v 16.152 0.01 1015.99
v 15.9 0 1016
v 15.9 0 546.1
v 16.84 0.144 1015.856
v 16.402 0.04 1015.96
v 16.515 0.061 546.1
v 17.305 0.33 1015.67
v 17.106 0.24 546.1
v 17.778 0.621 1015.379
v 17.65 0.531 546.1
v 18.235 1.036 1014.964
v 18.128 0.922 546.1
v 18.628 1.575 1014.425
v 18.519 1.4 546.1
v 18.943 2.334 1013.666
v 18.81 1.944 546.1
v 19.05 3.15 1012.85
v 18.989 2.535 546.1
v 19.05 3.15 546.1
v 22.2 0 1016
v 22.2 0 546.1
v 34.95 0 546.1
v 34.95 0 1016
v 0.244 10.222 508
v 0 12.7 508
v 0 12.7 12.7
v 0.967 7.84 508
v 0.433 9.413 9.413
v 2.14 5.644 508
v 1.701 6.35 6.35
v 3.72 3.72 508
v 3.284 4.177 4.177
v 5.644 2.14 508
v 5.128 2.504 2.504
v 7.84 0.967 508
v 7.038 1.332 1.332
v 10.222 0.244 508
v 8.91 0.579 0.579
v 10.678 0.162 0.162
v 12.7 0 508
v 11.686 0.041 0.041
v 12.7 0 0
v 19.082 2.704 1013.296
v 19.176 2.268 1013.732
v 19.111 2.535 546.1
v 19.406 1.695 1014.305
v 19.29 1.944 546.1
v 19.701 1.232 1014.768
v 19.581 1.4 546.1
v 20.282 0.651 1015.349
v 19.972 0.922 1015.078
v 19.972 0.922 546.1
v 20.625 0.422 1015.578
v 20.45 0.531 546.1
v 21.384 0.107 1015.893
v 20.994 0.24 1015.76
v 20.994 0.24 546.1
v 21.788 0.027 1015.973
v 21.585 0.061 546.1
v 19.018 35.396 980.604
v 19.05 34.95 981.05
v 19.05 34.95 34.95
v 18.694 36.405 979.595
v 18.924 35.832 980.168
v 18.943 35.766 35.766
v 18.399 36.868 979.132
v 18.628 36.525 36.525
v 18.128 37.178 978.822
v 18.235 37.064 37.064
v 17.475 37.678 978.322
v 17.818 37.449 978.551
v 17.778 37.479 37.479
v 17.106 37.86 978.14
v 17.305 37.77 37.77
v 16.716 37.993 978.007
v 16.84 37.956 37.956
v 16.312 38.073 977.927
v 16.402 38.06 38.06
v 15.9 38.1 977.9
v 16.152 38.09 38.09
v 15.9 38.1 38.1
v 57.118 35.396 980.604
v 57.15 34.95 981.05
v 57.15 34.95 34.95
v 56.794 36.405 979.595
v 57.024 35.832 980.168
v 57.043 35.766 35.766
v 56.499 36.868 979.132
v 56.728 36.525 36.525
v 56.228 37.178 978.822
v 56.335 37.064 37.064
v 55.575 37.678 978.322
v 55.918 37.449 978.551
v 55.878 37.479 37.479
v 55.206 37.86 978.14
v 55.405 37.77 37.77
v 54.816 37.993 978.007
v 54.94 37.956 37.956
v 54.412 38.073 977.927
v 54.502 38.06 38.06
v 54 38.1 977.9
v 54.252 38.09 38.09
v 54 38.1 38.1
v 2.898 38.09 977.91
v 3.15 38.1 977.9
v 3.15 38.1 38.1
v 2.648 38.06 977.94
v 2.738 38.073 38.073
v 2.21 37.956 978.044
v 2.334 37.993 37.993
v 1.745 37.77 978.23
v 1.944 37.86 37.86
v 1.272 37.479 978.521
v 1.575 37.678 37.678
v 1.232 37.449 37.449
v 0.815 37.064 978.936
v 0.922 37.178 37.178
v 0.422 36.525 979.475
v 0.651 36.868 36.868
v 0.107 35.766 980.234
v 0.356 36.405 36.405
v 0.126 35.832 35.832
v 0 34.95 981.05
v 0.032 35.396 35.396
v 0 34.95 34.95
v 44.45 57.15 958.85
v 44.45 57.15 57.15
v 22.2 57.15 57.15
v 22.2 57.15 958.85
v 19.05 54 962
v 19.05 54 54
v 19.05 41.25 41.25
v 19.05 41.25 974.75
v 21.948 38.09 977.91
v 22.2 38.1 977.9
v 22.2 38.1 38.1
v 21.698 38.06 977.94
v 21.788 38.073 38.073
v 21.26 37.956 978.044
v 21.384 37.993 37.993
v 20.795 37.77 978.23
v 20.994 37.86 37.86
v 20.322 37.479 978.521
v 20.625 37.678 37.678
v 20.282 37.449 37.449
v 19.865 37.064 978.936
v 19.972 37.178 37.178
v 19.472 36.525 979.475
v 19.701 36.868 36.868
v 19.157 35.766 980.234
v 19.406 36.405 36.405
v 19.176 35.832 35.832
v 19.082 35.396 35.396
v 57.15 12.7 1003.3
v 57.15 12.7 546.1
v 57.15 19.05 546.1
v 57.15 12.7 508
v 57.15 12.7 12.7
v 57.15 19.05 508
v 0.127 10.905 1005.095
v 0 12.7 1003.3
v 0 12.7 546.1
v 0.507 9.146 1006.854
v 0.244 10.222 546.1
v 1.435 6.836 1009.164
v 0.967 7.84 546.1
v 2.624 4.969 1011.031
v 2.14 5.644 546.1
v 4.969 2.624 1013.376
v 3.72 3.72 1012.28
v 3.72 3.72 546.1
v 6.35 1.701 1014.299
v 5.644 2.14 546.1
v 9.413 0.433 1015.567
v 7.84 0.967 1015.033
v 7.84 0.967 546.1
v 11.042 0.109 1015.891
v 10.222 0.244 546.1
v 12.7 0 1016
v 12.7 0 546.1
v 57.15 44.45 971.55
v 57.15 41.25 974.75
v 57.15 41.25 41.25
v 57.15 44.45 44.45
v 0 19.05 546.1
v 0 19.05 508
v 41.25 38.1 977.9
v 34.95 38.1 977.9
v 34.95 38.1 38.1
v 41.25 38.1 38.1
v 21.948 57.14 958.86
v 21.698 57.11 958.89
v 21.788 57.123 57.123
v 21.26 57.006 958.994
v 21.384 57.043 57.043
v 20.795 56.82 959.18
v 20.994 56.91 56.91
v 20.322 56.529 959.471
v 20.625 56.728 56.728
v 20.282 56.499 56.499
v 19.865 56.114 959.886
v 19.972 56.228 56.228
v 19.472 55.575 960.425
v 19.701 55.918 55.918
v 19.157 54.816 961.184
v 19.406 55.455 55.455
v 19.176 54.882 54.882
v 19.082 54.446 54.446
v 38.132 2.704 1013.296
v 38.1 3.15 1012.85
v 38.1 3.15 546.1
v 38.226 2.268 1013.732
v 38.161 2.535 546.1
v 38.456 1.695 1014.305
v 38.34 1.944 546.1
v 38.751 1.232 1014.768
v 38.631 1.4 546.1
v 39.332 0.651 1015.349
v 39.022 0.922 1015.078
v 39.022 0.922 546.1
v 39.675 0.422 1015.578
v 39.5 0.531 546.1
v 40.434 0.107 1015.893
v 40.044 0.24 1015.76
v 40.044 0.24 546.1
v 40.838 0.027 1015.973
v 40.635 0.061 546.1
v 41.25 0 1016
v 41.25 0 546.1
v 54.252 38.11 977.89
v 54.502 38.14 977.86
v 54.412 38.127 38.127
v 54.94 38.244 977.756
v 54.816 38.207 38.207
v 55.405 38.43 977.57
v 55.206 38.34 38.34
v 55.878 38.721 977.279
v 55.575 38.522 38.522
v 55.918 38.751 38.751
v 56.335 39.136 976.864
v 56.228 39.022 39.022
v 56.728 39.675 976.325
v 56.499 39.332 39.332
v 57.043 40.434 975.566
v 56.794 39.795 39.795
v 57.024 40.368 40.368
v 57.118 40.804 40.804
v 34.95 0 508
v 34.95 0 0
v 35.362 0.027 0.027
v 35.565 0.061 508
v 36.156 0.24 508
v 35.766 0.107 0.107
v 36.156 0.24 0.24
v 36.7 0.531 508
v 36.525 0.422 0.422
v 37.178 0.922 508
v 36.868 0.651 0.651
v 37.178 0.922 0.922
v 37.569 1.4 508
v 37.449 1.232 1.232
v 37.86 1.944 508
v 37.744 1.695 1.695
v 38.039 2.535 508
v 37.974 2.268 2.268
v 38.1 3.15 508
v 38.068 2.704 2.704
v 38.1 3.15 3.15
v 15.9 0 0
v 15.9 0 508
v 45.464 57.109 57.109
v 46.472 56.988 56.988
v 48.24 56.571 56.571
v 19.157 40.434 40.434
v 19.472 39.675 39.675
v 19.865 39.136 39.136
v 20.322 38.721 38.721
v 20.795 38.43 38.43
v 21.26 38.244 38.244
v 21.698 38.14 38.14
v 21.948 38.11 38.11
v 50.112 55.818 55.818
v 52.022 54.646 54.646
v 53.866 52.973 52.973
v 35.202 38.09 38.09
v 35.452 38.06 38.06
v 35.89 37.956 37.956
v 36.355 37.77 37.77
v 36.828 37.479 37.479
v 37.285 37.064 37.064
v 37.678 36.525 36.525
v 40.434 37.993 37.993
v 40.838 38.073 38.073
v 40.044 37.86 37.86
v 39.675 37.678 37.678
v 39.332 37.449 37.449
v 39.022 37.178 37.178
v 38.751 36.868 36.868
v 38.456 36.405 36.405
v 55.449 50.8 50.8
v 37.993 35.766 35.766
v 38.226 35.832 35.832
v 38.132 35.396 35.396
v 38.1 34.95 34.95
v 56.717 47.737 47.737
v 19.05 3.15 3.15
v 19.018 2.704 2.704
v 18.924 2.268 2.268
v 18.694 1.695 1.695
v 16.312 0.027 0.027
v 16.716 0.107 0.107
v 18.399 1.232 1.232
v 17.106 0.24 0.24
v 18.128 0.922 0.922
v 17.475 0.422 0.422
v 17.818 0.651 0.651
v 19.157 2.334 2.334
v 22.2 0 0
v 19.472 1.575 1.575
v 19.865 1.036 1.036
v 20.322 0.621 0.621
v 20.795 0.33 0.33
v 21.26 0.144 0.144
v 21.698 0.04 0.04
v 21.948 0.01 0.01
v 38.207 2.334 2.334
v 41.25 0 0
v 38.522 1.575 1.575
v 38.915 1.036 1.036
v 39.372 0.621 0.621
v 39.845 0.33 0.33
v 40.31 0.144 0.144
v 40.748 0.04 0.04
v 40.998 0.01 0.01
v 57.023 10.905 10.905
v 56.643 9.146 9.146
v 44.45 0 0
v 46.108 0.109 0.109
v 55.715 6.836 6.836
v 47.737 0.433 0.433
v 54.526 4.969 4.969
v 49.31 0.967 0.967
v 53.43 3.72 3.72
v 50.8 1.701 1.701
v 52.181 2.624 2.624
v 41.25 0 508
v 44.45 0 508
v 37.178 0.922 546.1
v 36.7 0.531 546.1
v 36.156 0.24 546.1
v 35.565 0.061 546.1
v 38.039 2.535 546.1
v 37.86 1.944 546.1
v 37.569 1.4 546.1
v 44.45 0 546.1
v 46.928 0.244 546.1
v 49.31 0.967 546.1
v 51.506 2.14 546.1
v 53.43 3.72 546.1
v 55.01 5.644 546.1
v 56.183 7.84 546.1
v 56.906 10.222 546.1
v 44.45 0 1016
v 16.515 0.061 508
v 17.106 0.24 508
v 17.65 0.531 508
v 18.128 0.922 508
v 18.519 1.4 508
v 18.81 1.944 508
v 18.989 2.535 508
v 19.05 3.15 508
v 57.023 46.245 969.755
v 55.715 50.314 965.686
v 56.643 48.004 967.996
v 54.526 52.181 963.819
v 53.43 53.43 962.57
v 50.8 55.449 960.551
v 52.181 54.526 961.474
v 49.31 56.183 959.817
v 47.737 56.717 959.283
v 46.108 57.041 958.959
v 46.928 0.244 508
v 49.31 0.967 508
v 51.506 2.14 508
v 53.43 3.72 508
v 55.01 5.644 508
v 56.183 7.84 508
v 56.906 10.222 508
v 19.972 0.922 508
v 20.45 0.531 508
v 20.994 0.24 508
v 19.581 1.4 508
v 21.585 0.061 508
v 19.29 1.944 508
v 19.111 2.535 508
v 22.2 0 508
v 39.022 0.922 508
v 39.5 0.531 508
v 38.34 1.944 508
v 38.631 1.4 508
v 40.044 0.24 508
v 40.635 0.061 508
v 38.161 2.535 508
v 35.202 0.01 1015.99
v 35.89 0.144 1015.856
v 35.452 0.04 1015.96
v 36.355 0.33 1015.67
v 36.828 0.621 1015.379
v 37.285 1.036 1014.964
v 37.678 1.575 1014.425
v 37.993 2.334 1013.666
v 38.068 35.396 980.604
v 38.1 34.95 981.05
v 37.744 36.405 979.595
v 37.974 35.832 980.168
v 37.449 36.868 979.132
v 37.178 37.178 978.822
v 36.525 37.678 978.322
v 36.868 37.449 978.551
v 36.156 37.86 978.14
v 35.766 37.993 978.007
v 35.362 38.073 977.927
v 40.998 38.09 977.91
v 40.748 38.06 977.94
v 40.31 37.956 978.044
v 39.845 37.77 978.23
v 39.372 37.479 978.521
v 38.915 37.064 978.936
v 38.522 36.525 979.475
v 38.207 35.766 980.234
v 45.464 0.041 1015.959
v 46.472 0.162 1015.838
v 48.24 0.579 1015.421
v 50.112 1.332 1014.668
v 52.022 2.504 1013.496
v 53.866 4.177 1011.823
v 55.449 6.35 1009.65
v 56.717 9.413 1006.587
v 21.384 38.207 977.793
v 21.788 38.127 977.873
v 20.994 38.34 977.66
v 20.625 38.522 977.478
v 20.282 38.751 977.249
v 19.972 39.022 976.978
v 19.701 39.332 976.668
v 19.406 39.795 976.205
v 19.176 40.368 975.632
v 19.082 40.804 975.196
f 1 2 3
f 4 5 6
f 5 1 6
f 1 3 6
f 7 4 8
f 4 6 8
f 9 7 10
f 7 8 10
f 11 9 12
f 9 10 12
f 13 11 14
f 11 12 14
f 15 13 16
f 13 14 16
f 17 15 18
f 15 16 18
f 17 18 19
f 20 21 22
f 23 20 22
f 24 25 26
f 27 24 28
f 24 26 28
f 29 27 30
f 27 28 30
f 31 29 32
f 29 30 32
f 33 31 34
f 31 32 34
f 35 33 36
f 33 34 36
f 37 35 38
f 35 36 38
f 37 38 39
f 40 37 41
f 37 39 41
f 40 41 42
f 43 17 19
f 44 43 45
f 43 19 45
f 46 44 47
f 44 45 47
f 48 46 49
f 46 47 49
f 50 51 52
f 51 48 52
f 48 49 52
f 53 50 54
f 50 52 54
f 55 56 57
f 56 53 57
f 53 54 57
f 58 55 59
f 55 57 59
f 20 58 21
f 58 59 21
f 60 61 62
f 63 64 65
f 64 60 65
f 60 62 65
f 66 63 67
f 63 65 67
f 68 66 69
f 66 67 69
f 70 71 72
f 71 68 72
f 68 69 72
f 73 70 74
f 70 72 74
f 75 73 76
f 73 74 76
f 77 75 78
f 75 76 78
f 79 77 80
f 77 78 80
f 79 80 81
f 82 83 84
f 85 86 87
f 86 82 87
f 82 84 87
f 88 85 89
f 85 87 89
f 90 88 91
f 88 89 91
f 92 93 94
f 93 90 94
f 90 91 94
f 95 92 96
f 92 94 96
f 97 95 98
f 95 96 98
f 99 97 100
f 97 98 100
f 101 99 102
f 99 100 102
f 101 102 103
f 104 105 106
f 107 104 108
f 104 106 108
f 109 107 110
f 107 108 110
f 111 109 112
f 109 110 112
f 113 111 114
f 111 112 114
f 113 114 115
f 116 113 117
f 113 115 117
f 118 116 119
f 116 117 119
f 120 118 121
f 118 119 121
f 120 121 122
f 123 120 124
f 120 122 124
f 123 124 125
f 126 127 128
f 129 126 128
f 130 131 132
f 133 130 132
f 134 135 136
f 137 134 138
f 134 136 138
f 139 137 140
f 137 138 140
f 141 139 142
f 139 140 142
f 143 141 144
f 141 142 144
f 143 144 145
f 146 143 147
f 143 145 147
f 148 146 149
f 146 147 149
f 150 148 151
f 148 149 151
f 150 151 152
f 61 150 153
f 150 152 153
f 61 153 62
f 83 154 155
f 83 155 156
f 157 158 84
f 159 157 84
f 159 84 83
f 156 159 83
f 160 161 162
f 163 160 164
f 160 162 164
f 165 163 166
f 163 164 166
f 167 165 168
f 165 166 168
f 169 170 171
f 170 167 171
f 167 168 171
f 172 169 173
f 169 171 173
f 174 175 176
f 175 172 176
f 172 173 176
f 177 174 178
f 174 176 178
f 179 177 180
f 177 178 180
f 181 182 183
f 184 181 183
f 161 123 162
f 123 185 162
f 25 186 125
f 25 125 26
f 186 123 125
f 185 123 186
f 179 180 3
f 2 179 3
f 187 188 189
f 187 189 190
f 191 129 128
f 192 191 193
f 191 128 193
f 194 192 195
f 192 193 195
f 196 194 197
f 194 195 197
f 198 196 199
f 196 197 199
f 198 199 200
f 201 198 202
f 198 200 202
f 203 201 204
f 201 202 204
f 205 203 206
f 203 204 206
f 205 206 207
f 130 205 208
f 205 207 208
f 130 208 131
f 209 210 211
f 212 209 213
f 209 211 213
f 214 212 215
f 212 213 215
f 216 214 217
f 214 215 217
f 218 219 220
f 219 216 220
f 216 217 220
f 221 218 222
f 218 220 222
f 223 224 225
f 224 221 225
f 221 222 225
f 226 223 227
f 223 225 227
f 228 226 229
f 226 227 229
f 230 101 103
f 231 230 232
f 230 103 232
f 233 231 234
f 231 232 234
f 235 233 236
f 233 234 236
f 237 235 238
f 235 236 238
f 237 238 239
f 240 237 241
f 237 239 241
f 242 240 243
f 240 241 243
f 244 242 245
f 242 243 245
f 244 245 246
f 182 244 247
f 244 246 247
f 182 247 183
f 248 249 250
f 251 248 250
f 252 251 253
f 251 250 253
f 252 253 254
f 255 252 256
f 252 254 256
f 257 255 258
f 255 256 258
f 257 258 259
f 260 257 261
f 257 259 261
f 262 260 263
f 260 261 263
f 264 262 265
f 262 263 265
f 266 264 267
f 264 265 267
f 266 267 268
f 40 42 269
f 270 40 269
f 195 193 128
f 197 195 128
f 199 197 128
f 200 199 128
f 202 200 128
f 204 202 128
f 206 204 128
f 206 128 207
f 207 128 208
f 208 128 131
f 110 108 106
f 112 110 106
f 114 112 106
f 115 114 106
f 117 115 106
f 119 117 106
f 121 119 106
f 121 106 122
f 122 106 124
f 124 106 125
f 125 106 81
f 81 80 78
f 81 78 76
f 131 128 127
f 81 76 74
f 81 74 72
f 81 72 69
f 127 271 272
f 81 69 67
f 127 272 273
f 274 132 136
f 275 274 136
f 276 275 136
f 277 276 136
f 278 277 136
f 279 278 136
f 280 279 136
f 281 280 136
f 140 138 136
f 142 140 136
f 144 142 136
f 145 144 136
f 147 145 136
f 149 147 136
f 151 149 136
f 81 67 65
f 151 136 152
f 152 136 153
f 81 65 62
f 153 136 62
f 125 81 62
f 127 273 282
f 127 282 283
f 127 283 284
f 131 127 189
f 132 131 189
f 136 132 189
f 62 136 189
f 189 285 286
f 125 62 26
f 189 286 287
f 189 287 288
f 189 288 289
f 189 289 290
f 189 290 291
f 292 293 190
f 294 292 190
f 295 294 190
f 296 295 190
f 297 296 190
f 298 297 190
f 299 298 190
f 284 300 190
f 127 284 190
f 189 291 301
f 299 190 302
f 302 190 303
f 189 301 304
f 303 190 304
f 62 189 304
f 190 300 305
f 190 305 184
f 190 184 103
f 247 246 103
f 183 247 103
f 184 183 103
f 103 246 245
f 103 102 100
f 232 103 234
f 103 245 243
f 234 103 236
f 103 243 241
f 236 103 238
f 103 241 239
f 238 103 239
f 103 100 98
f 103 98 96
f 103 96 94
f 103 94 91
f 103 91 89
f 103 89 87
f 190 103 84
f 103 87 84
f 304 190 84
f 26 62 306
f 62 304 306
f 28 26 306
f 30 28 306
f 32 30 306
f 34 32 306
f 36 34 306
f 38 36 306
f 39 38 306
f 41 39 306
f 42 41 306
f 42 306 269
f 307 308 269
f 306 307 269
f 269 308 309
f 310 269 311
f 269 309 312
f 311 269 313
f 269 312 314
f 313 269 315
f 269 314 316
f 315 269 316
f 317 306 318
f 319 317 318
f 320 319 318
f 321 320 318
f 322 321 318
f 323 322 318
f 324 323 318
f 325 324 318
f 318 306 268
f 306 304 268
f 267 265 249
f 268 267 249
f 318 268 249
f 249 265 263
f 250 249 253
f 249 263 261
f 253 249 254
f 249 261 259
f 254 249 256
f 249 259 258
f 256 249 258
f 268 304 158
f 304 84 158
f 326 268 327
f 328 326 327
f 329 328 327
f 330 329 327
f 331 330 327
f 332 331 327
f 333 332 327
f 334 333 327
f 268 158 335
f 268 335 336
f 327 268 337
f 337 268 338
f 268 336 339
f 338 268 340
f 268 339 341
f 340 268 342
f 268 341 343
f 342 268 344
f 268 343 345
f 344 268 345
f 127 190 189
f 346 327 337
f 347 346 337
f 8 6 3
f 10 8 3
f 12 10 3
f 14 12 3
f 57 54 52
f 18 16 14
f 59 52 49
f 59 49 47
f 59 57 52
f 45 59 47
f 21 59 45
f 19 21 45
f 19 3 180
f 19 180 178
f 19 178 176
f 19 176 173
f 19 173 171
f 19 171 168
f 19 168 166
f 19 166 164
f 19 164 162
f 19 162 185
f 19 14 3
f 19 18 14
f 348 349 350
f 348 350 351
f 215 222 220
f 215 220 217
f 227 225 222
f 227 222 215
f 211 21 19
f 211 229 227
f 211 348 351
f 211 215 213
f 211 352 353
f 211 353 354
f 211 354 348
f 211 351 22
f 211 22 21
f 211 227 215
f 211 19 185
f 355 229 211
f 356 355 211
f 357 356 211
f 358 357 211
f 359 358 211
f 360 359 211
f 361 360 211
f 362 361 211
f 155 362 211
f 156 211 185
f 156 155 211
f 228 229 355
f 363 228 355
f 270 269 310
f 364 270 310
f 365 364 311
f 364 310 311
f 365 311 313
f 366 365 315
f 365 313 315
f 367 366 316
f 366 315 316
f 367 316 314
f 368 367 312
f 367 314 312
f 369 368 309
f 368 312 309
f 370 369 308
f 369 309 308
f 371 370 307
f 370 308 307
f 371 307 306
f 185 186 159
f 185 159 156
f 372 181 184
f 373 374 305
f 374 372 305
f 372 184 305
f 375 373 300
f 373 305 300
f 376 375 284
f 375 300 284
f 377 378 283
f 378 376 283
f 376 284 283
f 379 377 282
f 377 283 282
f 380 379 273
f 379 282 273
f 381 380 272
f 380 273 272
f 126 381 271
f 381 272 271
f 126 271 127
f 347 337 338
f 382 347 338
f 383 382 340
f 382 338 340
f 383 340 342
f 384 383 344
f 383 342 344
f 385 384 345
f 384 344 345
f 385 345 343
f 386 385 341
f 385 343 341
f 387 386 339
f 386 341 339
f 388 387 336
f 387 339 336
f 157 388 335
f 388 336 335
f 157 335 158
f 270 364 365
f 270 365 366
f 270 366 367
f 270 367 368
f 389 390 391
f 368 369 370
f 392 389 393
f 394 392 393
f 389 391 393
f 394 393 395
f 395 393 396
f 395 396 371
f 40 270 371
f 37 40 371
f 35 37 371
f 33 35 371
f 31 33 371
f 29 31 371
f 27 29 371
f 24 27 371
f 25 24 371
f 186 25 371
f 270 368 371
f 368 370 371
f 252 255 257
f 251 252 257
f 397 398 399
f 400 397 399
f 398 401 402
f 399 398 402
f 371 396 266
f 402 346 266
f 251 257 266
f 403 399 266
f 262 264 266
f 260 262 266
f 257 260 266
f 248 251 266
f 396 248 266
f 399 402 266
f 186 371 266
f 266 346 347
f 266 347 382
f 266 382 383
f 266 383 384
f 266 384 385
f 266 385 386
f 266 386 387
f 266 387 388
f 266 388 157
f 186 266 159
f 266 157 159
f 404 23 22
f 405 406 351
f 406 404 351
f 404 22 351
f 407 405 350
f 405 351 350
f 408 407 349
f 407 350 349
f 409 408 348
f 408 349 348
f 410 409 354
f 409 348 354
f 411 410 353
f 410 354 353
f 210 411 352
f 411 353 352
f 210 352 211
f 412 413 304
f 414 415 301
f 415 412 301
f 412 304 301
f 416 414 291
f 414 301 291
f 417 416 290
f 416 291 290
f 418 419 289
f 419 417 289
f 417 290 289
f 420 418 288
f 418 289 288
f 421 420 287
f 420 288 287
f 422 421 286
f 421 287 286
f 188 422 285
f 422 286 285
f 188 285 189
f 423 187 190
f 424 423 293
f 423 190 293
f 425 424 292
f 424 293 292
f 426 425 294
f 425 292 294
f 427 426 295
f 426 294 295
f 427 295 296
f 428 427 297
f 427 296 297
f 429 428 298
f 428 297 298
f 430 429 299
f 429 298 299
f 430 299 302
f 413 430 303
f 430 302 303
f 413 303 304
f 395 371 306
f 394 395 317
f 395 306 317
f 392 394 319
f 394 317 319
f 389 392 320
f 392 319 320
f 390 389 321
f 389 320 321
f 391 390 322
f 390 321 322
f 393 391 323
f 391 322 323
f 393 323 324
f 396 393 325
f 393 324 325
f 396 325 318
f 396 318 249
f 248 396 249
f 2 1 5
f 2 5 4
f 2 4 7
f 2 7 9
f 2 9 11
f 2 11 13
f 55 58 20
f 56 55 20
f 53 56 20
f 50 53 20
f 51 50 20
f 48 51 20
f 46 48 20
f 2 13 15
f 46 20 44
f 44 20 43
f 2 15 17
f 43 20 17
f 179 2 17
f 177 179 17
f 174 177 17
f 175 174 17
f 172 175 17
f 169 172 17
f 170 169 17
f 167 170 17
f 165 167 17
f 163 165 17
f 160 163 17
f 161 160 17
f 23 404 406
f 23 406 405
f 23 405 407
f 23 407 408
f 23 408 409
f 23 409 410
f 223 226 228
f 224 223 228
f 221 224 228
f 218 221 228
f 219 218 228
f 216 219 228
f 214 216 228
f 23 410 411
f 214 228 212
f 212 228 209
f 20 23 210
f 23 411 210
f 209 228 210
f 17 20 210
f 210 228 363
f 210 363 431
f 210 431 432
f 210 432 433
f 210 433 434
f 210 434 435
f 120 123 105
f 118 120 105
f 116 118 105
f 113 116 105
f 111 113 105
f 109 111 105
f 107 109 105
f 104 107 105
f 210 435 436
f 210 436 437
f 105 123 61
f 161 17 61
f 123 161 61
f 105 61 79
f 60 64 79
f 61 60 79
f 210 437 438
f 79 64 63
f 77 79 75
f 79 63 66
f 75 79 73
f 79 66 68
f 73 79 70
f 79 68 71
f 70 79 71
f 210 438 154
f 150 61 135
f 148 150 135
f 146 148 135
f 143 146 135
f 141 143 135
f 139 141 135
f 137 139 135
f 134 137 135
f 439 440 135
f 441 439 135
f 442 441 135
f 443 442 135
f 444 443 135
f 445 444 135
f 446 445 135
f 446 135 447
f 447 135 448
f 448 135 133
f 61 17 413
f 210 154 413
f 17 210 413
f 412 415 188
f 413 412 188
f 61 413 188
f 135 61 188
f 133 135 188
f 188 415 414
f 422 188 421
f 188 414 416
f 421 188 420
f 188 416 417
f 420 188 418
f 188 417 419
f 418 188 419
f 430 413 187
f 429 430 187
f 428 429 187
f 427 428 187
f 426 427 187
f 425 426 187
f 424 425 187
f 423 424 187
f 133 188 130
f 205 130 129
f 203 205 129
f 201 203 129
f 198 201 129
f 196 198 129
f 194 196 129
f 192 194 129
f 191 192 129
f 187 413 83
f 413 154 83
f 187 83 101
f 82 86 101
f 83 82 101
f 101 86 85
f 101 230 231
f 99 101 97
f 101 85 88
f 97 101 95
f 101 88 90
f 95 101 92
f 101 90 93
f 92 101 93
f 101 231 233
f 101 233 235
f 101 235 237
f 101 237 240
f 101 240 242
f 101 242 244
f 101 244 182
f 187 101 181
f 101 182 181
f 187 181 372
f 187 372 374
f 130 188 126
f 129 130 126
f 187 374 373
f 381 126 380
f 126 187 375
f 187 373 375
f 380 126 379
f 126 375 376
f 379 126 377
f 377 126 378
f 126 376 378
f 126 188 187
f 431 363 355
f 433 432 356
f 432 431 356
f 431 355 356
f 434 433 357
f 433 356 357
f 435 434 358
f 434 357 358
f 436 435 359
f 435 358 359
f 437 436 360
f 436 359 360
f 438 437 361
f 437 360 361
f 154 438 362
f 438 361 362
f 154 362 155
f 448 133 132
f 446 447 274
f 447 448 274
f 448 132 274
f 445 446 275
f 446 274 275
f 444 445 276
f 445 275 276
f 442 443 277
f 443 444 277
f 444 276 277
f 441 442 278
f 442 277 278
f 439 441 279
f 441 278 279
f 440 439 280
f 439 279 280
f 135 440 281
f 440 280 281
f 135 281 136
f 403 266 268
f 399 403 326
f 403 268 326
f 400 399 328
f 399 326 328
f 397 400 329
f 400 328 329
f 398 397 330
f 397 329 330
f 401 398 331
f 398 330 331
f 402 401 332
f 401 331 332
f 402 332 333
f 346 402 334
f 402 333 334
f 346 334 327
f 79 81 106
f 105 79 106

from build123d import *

# Parameters (mm, degrees)
F1_DEPTH = 1016
F3_DEPTH = 57.151
F4_W     = 19.05
F4_H     = 38.1
F5_DEPTH = 57.151


# Not quite as in the source:
# - ends of sketch curves that miss each other by under 0.0002 mm in the source are joined


with BuildPart() as f1:
    # F0 (on Top) → F1 (new body)
    with BuildSketch(Plane.XY):
        with BuildLine():
            ThreePointArc((0, 12.7), (3.7197438789, 3.7197438789), (12.7, 0))
            Line((12.7, 0), (15.9004, 0))
            ThreePointArc((15.9004, 0), (18.127503518, 0.922496482), (19.05, 3.1496))
            Line((19.05, 3.1496), (19.05, 34.9504))
            ThreePointArc((19.05, 34.9504), (18.127503518, 37.177503518), (15.9004, 38.1))
            Line((15.9004, 38.1), (3.1496, 38.1))
            ThreePointArc((3.1496, 38.1), (0.922496482, 37.177503518), (0, 34.9504))
            Line((0, 34.9504), (0, 12.7))
        make_face()
        with BuildLine():
            Line((19.05, 34.9504), (19.05, 3.1496))
            ThreePointArc((19.05, 3.1496), (19.972496482, 0.922496482), (22.1996, 0))
            Line((22.1996, 0), (34.9504, 0))
            ThreePointArc((34.9504, 0), (37.177503518, 0.922496482), (38.1, 3.1496))
            Line((38.1, 3.1496), (38.1, 34.9504))
            ThreePointArc((38.1, 34.9504), (37.177503518, 37.177503518), (34.9504, 38.1))
            Line((34.9504, 38.1), (22.1996, 38.1))
            ThreePointArc((22.1996, 38.1), (19.972496482, 37.177503518), (19.05, 34.9504))
        make_face()
        with BuildLine():
            Line((38.1, 34.9504), (38.1, 3.1496))
            ThreePointArc((38.1, 3.1496), (39.022496482, 0.922496482), (41.2496, 0))
            Line((41.2496, 0), (44.45, 0))
            ThreePointArc((44.45, 0), (53.4302561211, 3.7197438789), (57.15, 12.7))
            Line((57.15, 12.7), (57.15, 34.9504))
            ThreePointArc((57.15, 34.9504), (56.227503518, 37.177503518), (54.0004, 38.1))
            Line((54.0004, 38.1), (41.2496, 38.1))
            ThreePointArc((41.2496, 38.1), (39.022496482, 37.177503518), (38.1, 34.9504))
        make_face()
        with BuildLine():
            ThreePointArc((19.0499988437, 41.2496), (19.9724953256, 39.022496482), (22.1995988437, 38.1))
            Line((22.1995988437, 38.1), (34.9504, 38.1))
            Line((34.9504, 38.1), (41.2496, 38.1))
            Line((41.2496, 38.1), (54.0004, 38.1))
            ThreePointArc((54.0004, 38.1), (56.2275023617, 39.022496482), (57.1499988437, 41.2496))
            Line((57.1499988437, 41.2496), (57.1499988437, 44.45))
            ThreePointArc((57.1499988437, 44.45), (53.4302549647, 53.4302561211), (44.4499988437, 57.15))
            Line((44.4499988437, 57.15), (22.1995988437, 57.15))
            ThreePointArc((22.1995988437, 57.15), (19.9724953256, 56.227503518), (19.0499988437, 54.0004))
            Line((19.0499988437, 54.0004), (19.0499988437, 41.2496))
        make_face()
    extrude(amount=F1_DEPTH)

    # F2 (on face) → F3 (cut, through all)
    with BuildSketch(Plane.YZ.offset(57.15)):
        Polygon((57.15, 0), (57.15, 57.15), (0, 0), (12.7, 0), align=None)
        Polygon((12.7, 1016), (0, 1016), (57.15, 958.85), (57.15, 1016), align=None)
    extrude(amount=-F3_DEPTH, mode=Mode.SUBTRACT)

    # F4 (on face) → F5 (cut, through all)
    with BuildSketch(Plane.YZ.offset(57.15)):
        with Locations((9.525, 527.05)):
            Rectangle(F4_W, F4_H)
    extrude(amount=-F5_DEPTH, mode=Mode.SUBTRACT)


solid = f1.part
